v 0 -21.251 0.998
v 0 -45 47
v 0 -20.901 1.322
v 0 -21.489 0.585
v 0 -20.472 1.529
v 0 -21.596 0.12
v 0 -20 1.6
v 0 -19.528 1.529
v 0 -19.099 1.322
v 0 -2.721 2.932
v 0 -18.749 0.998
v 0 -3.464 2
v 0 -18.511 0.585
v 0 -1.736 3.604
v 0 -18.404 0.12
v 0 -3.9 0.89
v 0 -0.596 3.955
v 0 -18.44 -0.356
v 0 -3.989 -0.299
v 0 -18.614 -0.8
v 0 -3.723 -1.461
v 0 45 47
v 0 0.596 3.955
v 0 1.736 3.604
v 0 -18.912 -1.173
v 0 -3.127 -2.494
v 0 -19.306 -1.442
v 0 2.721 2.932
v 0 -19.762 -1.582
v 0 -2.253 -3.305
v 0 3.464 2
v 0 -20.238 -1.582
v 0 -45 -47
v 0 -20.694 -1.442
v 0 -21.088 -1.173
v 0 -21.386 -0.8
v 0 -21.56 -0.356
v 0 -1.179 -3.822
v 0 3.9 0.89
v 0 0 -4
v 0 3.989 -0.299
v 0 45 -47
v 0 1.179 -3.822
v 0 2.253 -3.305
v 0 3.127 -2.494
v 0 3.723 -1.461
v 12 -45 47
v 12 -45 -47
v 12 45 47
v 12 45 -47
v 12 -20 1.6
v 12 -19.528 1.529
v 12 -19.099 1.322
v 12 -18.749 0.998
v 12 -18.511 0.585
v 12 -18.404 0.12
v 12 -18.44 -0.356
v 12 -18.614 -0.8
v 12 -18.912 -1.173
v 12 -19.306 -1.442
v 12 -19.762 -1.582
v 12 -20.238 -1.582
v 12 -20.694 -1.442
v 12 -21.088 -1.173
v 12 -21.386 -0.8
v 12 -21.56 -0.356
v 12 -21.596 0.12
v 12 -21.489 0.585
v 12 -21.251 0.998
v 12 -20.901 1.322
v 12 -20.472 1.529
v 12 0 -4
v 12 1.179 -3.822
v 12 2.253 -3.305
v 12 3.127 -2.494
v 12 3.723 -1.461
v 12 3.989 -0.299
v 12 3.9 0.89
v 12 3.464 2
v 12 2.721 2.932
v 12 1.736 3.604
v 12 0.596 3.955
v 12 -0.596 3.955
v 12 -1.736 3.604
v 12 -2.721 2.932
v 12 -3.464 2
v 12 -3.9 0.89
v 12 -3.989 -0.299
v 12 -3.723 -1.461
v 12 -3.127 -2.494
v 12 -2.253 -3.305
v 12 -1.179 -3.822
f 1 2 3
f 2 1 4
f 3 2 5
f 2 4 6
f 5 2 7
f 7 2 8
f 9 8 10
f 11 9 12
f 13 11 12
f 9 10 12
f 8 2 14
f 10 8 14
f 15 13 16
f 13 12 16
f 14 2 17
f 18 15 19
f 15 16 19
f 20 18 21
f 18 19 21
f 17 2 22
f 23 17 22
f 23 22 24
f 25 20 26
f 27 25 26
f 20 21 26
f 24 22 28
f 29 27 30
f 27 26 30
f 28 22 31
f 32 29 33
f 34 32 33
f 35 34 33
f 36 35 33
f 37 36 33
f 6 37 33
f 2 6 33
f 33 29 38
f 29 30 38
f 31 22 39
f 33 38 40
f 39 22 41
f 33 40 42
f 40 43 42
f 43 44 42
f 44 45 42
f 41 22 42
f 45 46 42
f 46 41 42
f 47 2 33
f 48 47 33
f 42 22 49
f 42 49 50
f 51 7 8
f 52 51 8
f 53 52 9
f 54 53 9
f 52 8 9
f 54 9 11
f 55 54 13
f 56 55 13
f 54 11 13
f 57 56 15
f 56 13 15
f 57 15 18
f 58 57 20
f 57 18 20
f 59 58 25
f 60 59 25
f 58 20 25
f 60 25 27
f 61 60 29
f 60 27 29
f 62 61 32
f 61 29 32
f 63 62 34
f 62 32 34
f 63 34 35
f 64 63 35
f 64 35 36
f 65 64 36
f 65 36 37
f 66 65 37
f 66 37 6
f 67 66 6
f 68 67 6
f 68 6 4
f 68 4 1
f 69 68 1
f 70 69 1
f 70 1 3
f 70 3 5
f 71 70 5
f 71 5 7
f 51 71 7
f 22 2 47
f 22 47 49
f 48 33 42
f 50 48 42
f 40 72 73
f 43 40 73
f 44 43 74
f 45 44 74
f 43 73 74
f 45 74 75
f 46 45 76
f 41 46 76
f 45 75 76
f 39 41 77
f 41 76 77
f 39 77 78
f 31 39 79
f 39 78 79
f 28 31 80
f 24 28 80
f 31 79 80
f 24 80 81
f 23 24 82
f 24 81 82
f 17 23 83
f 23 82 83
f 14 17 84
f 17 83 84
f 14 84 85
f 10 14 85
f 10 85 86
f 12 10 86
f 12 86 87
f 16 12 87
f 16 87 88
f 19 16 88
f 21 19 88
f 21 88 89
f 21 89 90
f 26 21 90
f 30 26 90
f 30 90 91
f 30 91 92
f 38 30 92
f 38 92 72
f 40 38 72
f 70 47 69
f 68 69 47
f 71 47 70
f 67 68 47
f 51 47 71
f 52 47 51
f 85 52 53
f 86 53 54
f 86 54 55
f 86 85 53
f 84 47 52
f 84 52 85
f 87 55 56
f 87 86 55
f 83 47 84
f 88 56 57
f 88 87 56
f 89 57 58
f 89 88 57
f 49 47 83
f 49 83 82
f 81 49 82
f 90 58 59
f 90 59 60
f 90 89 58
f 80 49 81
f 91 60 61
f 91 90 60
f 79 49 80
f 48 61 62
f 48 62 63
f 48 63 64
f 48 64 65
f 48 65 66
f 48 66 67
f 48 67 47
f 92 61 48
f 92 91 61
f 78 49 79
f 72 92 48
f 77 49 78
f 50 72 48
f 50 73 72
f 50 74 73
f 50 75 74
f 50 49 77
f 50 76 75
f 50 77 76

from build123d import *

# Parameters (mm, degrees)
SKETCH1_W           = 94
SKETCH1_H           = 90
BOSS_EXTRUDE1_DEPTH = 12
SKETCH2_R           = 4
CUT_EXTRUDE1_DEPTH  = 67.166456759
SKETCH3_R           = 1.6
CUT_EXTRUDE2_DEPTH  = 67.166456759


with BuildPart() as part:
    # Sketch1 → Boss-Extrude1 (new body)
    with BuildSketch(Plane(origin=(0, 0, 0), x_dir=(0, 0, -1), z_dir=(1, 0, 0))):
        Rectangle(SKETCH1_W, SKETCH1_H)
    extrude(amount=BOSS_EXTRUDE1_DEPTH)

    # Sketch2 → Cut-Extrude1 (cut, through all)
    with BuildSketch(Plane(origin=(12, 0, 0), x_dir=(0, 0, -1), z_dir=(1, 0, 0))):
        Circle(SKETCH2_R)
    extrude(amount=-CUT_EXTRUDE1_DEPTH, mode=Mode.SUBTRACT)

    # Sketch3 → Cut-Extrude2 (cut, through all)
    with BuildSketch(Plane.ZY):
        with Locations((0, -20)):
            Circle(SKETCH3_R)
    extrude(amount=-CUT_EXTRUDE2_DEPTH, mode=Mode.SUBTRACT)


solid = part.part
